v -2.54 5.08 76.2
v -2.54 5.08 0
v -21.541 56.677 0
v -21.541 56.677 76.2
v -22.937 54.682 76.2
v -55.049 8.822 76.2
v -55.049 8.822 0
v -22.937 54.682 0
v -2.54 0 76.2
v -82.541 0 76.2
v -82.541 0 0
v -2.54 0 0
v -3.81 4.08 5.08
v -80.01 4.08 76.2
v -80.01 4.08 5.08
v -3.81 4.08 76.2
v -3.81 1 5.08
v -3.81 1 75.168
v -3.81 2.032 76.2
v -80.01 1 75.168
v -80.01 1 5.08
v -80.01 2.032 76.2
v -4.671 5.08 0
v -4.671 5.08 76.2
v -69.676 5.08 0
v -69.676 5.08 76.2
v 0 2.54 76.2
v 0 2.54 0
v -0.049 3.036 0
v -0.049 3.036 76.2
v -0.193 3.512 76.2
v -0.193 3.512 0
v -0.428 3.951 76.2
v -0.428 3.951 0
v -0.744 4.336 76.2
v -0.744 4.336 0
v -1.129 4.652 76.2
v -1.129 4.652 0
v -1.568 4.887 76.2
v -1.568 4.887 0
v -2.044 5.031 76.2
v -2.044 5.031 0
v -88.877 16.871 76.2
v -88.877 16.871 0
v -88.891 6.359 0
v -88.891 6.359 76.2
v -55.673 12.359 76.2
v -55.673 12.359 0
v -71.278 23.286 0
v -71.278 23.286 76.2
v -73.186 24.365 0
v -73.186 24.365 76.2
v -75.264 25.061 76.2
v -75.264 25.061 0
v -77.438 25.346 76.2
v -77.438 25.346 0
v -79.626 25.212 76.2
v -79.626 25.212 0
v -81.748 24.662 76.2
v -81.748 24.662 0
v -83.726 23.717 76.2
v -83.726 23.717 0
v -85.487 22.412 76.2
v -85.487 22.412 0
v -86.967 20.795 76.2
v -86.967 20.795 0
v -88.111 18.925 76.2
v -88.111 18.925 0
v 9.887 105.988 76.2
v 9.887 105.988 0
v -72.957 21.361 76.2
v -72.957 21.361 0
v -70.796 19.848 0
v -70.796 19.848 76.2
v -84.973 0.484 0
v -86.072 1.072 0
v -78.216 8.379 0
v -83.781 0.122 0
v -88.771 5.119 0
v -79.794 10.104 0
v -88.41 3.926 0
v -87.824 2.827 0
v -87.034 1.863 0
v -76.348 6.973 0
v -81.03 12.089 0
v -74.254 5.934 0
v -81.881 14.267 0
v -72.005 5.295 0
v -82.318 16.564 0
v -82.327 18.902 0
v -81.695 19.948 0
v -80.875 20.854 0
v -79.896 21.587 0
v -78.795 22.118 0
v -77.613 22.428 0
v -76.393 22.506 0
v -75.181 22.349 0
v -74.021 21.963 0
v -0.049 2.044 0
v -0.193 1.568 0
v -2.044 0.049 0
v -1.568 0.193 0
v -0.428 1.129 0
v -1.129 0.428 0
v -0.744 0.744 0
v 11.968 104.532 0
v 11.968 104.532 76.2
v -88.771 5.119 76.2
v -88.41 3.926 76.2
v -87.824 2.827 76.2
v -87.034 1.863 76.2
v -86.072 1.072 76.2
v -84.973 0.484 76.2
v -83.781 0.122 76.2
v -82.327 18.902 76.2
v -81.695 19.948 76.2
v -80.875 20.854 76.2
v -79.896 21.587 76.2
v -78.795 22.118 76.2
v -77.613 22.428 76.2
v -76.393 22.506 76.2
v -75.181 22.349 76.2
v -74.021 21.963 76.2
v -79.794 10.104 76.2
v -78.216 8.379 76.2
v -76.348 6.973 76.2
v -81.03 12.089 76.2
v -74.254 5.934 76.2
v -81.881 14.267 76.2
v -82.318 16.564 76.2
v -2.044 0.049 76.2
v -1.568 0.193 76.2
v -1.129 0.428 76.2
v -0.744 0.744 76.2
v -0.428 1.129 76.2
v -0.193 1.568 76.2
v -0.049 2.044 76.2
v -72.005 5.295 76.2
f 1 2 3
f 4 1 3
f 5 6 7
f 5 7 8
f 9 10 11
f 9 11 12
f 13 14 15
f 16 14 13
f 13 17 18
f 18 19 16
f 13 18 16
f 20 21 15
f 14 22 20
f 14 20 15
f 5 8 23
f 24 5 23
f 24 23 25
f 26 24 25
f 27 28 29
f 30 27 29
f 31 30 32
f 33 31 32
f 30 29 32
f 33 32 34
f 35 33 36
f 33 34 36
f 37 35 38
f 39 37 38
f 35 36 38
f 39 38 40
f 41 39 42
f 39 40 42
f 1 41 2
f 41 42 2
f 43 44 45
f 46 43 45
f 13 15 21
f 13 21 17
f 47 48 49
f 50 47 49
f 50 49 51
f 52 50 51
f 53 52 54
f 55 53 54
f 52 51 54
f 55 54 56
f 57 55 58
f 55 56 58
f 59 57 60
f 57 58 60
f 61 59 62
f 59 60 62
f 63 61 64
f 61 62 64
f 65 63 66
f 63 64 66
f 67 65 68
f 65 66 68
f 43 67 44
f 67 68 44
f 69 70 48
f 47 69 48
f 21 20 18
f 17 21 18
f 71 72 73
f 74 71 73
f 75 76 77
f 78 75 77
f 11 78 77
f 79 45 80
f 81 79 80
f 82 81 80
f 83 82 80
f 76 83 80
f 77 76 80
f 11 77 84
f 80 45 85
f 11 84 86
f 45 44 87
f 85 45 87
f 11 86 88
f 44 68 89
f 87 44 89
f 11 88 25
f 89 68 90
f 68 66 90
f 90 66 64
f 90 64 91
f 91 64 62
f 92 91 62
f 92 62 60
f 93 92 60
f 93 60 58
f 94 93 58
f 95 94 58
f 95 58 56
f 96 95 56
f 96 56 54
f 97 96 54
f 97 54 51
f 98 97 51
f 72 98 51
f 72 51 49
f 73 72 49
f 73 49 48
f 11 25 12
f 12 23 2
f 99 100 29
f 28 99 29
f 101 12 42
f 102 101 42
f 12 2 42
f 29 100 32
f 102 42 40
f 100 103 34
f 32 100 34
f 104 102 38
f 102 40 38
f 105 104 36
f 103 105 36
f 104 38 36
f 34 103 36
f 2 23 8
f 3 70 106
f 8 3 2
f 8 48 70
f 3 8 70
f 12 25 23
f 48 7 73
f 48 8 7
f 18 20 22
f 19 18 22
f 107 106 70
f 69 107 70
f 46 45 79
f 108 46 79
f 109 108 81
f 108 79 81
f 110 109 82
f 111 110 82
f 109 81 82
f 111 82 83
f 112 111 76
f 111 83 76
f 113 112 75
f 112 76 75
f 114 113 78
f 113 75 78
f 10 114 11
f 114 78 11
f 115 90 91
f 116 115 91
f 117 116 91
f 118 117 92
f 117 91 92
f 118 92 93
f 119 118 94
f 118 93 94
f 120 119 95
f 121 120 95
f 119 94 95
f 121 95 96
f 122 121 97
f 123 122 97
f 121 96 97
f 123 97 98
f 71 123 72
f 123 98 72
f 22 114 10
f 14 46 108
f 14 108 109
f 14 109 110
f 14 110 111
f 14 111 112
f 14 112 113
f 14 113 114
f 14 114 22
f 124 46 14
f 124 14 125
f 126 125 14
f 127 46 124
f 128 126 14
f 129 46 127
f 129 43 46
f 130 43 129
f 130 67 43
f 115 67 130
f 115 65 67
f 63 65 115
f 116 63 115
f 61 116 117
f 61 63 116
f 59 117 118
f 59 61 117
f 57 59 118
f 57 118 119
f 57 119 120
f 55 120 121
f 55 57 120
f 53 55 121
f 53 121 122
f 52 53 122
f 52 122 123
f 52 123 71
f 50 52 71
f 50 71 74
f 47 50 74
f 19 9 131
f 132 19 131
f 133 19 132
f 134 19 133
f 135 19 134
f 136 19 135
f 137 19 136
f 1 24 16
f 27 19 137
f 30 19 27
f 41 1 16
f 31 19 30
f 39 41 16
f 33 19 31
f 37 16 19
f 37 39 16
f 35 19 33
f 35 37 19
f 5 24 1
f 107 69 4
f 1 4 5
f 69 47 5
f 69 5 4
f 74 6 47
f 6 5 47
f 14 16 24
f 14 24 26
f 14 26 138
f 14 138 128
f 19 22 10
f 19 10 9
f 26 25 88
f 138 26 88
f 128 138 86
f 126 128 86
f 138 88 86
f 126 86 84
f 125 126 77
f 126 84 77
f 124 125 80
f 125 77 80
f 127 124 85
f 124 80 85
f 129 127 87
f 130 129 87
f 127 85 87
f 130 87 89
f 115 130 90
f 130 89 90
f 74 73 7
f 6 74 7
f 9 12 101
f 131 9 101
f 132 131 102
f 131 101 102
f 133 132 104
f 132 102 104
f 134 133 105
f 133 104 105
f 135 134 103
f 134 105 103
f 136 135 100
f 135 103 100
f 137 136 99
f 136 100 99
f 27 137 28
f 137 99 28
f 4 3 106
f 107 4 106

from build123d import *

# Parameters (mm, degrees)
F1_DEPTH    = 76.2
F2_W        = 76.2
F2_H        = 3.08
F3_DEPTH    = 71.12
F4_W        = 76.2
F4_H        = 2.54
F5_DEPTH    = 2.032
F6_T4_DEPTH = 76.2
F8_DEPTH    = 76.2


# Not quite as in the source:
# - a fillet or chamfer that OpenCascade refuses, or shapes differently, is made with other operations: its cross-section is extruded or revolved along the edge and cut away or added


with BuildPart() as f1:
    # F0 (on Top) → F1 (new body)
    with BuildSketch(Plane.XY):
        with BuildLine():
            Line((-71.12, 0), (-2.54, 0))
            ThreePointArc((-2.54, 0), (-0.7439487758, 0.7439487758), (0, 2.54))
            ThreePointArc((0, 2.54), (-0.7439487758, 4.3360512242), (-2.54, 5.08))
            Line((-2.54, 5.08), (-69.676465438, 5.08))
            ThreePointArc((-69.676465438, 5.08), (-79.0448551931, 9.2054286756), (-82.3268475088, 18.9015317486))
            ThreePointArc((-82.3268475088, 18.9015317486), (-78.2116767293, 22.3014792843), (-72.9571412523, 21.3611970334))
            Line((-72.9571412523, 21.3611970334), (-70.7962627974, 19.8481336501))
            Line((-70.7962627974, 19.8481336501), (-55.0490144099, 8.8217916231))
            Line((-55.0490144099, 8.8217916231), (11.9676564134, 104.5315164778))
            Line((11.9676564134, 104.5315164778), (9.8870102209, 105.9884006261))
            Line((9.8870102209, 105.9884006261), (-55.672776454, 12.3593219639))
            Line((-55.672776454, 12.3593219639), (-71.2776228977, 23.2859530764))
            ThreePointArc((-71.2776228977, 23.2859530764), (-81.747690686, 24.661984001), (-88.8767730732, 16.871479209))
            Line((-88.8767730732, 16.871479209), (-88.8912459344, 6.3587420222))
            ThreePointArc((-88.8912459344, 6.3587420222), (-87.0344697211, 1.8629637755), (-82.541251952, 0))
            Line((-82.541251952, 0), (-71.12, 0))
        make_face()
    extrude(amount=F1_DEPTH)

    # F2 (on face) → F3 (cut)
    with BuildSketch(Plane.XY.offset(76.2)):
        with Locations((-41.91, 2.54)):
            Rectangle(F2_W, F2_H)
    extrude(amount=-F3_DEPTH, mode=Mode.SUBTRACT)

    # F4 (on Front) → F5 (join)
    with BuildSketch(Plane.XZ):
        with Locations((-41.91, 74.93)):
            Rectangle(F4_W, F4_H)
    extrude(amount=-F5_DEPTH)

    # F6: chamfer of 2.54 on 1 edges, made by hand


with BuildPart() as f6_tool2:
    # F6_s3 → F6_t4 (new body)
    with BuildSketch(Plane.YZ.offset(-80.01)):
        Polygon((-0.508, 73.66), (2.032, 76.2), (2.032, 73.66), align=None)
    extrude(amount=F6_T4_DEPTH)

    split(bisect_by=Plane.XZ.offset(-1), keep=Keep.BOTTOM)


with BuildPart() as f1_1:
    add(f1.part)

    # F6_t1: cut F6_tool2
    add(f6_tool2.part, mode=Mode.SUBTRACT)

    # F7 (on face) → F8 (join)
    with BuildSketch(Plane.XY.offset(76.2)):
        Polygon((-4.6713010828, 5.08), (-2.54, 5.08), (-21.5406789982, 56.6766540504), (-22.9374096266, 54.6819159876), align=None)
    extrude(amount=-F8_DEPTH)


solid = f1_1.part
